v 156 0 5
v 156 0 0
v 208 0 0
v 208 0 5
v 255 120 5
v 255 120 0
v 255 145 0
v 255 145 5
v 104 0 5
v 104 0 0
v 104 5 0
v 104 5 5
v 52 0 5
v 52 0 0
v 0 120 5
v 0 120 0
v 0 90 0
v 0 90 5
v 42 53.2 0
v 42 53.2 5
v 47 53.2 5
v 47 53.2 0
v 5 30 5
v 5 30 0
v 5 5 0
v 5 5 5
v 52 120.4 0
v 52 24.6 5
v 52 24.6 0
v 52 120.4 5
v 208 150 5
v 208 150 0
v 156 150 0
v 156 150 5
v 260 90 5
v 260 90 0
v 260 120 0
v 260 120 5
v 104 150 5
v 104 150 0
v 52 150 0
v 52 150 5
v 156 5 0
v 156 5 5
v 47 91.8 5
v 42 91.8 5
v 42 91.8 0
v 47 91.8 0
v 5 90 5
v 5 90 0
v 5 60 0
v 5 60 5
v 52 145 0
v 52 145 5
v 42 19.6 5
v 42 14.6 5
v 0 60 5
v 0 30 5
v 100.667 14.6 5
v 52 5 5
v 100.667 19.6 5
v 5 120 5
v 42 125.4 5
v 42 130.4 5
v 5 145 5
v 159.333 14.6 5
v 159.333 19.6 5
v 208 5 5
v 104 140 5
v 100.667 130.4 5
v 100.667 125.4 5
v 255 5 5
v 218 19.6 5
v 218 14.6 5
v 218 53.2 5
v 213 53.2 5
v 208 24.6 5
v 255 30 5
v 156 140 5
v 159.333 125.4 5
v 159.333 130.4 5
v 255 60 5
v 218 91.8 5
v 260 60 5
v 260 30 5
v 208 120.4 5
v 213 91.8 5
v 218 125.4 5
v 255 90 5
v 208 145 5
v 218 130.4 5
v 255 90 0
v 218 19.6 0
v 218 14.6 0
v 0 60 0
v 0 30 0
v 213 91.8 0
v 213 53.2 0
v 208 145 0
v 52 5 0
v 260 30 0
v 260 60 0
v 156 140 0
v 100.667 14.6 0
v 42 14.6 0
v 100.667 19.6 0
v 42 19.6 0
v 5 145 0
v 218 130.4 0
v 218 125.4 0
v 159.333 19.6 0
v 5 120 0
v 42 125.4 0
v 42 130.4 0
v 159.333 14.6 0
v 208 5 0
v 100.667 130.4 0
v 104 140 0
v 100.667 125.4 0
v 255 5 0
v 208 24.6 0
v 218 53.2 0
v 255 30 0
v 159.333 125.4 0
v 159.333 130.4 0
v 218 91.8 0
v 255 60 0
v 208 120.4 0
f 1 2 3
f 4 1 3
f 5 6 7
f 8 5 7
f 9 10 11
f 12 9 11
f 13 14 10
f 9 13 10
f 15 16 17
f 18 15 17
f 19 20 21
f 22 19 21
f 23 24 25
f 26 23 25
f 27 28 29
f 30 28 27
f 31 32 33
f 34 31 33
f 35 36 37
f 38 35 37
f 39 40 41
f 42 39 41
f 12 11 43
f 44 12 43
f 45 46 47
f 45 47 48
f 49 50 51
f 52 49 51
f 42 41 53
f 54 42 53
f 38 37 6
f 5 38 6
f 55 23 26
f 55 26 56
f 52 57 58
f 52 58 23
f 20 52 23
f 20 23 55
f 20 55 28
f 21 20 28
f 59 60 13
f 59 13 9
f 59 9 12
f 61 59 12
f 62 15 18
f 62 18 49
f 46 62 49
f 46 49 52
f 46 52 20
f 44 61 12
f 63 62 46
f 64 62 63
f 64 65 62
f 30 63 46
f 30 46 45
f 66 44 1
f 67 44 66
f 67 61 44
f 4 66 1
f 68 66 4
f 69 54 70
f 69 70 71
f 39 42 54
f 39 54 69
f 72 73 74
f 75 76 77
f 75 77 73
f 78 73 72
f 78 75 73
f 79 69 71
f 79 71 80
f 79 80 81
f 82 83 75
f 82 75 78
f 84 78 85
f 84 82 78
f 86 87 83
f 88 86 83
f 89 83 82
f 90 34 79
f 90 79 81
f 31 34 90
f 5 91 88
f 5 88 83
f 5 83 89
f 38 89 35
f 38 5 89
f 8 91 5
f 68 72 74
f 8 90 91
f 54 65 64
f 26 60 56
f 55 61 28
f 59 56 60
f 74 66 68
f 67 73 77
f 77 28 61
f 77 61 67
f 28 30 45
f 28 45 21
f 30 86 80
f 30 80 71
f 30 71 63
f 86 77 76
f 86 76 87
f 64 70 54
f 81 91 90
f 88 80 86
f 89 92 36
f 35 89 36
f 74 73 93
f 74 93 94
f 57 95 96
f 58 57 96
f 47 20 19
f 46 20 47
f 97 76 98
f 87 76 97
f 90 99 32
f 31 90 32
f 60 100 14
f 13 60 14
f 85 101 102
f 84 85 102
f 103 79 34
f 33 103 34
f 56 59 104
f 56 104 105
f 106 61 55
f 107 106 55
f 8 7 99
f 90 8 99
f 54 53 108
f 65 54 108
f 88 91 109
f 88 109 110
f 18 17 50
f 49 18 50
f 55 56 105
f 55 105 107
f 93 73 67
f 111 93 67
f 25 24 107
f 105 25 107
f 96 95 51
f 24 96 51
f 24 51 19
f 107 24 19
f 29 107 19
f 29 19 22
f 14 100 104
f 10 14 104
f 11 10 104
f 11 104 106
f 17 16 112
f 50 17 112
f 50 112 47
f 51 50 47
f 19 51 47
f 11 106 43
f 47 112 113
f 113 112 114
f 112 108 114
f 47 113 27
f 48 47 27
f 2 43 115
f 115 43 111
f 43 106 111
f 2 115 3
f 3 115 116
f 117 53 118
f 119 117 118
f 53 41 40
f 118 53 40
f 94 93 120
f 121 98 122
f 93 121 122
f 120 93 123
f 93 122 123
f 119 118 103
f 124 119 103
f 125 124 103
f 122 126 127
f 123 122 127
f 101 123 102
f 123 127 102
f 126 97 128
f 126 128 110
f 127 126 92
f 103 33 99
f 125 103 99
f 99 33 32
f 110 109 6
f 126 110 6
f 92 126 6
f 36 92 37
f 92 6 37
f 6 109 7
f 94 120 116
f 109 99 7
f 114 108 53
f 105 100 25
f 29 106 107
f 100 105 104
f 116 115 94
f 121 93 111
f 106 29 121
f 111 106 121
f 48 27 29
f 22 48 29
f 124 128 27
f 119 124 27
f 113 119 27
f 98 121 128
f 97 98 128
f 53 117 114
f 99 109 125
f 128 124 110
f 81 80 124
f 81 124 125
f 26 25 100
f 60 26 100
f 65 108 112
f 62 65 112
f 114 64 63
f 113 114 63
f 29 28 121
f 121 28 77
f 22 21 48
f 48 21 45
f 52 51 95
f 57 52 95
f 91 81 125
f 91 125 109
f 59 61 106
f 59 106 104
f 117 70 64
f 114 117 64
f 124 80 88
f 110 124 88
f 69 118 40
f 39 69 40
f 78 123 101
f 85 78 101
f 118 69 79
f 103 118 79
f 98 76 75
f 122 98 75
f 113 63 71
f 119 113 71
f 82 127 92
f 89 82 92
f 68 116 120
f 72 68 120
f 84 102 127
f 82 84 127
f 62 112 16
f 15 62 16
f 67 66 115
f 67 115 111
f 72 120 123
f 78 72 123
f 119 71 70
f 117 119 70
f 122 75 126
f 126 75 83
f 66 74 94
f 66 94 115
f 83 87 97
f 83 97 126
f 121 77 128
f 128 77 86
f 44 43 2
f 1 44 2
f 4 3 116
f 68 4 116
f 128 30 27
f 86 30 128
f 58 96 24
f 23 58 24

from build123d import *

# Parameters (mm, degrees)
SALIENTE_EXTRUIR1_DEPTH = 5
CROQUIS2_W              = 52
CROQUIS2_H              = 5
CORTAR_EXTRUIR1_DEPTH   = 10
CROQUIS3_W              = 5
CROQUIS3_H              = 38.6
CROQUIS3_W_2            = 156
CROQUIS3_H_2            = 95.8
CORTAR_EXTRUIR2_DEPTH   = 10


with BuildPart() as part:
    # Croquis1 → Saliente-Extruir1 (new body)
    with BuildSketch(Plane.XY):
        Polygon((52, 0), (104, 0), (104, 5), (156, 5), (156, 0), (208, 0), (208, 5), (255, 5), (255, 30), (260, 30), (260, 60), (255, 60), (255, 90), (260, 90), (260, 120), (255, 120), (255, 145), (208, 145), (208, 150), (156, 150), (156, 145), (104, 145), (104, 150), (52, 150), (52, 145), (5, 145), (5, 120), (0, 120), (0, 90), (5, 90), (5, 60), (0, 60), (0, 30), (5, 30), (5, 5), (52, 5), align=None)
    extrude(amount=SALIENTE_EXTRUIR1_DEPTH)

    # Croquis2 → Cortar-Extruir1 (cut)
    with BuildSketch(Plane.XY.offset(5)):
        with Locations((130, 142.5)):
            Rectangle(CROQUIS2_W, CROQUIS2_H)
    extrude(amount=-CORTAR_EXTRUIR1_DEPTH, mode=Mode.SUBTRACT)

    # Croquis3 → Cortar-Extruir2 (cut)
    with BuildSketch(Plane.XY.offset(5)):
        with Locations((44.5, 72.5)):
            Rectangle(CROQUIS3_W, CROQUIS3_H)
        with Locations((130, 72.5)):
            Rectangle(CROQUIS3_W_2, CROQUIS3_H_2)
        Polygon((47, 19.6), (100.666666667, 19.6), (100.666666667, 14.6), (42, 14.6), (42, 19.6), align=None)
        with Locations((215.5, 72.5)):
            Rectangle(CROQUIS3_W, CROQUIS3_H)
        Polygon((47, 125.4), (100.666666667, 125.4), (100.666666667, 130.4), (42, 130.4), (42, 125.4), align=None)
        Polygon((218, 130.4), (218, 125.4), (213, 125.4), (159.333333333, 125.4), (159.333333333, 130.4), align=None)
        Polygon((159.333333333, 14.6), (159.333333333, 19.6), (213, 19.6), (218, 19.6), (218, 14.6), align=None)
    extrude(amount=-CORTAR_EXTRUIR2_DEPTH, mode=Mode.SUBTRACT)


solid = part.part
